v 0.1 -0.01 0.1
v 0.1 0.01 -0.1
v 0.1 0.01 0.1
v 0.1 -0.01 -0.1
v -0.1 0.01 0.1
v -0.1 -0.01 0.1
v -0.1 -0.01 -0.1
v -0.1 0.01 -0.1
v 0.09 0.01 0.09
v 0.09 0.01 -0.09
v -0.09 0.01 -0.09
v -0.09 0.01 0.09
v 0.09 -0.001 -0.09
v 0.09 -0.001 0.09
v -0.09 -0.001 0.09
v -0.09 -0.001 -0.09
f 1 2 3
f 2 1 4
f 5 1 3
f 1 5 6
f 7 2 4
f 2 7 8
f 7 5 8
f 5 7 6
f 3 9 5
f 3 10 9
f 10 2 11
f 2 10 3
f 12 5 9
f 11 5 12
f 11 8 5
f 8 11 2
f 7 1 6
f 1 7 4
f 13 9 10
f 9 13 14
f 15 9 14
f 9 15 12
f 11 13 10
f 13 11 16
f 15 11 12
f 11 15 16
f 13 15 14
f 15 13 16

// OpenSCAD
difference () {
    cube([0.2, 0.02, 0.2], center=true);
    translate([0, 0.005, 0]) {
        cube([0.18, 0.012, 0.18], center=true);
    }
}
